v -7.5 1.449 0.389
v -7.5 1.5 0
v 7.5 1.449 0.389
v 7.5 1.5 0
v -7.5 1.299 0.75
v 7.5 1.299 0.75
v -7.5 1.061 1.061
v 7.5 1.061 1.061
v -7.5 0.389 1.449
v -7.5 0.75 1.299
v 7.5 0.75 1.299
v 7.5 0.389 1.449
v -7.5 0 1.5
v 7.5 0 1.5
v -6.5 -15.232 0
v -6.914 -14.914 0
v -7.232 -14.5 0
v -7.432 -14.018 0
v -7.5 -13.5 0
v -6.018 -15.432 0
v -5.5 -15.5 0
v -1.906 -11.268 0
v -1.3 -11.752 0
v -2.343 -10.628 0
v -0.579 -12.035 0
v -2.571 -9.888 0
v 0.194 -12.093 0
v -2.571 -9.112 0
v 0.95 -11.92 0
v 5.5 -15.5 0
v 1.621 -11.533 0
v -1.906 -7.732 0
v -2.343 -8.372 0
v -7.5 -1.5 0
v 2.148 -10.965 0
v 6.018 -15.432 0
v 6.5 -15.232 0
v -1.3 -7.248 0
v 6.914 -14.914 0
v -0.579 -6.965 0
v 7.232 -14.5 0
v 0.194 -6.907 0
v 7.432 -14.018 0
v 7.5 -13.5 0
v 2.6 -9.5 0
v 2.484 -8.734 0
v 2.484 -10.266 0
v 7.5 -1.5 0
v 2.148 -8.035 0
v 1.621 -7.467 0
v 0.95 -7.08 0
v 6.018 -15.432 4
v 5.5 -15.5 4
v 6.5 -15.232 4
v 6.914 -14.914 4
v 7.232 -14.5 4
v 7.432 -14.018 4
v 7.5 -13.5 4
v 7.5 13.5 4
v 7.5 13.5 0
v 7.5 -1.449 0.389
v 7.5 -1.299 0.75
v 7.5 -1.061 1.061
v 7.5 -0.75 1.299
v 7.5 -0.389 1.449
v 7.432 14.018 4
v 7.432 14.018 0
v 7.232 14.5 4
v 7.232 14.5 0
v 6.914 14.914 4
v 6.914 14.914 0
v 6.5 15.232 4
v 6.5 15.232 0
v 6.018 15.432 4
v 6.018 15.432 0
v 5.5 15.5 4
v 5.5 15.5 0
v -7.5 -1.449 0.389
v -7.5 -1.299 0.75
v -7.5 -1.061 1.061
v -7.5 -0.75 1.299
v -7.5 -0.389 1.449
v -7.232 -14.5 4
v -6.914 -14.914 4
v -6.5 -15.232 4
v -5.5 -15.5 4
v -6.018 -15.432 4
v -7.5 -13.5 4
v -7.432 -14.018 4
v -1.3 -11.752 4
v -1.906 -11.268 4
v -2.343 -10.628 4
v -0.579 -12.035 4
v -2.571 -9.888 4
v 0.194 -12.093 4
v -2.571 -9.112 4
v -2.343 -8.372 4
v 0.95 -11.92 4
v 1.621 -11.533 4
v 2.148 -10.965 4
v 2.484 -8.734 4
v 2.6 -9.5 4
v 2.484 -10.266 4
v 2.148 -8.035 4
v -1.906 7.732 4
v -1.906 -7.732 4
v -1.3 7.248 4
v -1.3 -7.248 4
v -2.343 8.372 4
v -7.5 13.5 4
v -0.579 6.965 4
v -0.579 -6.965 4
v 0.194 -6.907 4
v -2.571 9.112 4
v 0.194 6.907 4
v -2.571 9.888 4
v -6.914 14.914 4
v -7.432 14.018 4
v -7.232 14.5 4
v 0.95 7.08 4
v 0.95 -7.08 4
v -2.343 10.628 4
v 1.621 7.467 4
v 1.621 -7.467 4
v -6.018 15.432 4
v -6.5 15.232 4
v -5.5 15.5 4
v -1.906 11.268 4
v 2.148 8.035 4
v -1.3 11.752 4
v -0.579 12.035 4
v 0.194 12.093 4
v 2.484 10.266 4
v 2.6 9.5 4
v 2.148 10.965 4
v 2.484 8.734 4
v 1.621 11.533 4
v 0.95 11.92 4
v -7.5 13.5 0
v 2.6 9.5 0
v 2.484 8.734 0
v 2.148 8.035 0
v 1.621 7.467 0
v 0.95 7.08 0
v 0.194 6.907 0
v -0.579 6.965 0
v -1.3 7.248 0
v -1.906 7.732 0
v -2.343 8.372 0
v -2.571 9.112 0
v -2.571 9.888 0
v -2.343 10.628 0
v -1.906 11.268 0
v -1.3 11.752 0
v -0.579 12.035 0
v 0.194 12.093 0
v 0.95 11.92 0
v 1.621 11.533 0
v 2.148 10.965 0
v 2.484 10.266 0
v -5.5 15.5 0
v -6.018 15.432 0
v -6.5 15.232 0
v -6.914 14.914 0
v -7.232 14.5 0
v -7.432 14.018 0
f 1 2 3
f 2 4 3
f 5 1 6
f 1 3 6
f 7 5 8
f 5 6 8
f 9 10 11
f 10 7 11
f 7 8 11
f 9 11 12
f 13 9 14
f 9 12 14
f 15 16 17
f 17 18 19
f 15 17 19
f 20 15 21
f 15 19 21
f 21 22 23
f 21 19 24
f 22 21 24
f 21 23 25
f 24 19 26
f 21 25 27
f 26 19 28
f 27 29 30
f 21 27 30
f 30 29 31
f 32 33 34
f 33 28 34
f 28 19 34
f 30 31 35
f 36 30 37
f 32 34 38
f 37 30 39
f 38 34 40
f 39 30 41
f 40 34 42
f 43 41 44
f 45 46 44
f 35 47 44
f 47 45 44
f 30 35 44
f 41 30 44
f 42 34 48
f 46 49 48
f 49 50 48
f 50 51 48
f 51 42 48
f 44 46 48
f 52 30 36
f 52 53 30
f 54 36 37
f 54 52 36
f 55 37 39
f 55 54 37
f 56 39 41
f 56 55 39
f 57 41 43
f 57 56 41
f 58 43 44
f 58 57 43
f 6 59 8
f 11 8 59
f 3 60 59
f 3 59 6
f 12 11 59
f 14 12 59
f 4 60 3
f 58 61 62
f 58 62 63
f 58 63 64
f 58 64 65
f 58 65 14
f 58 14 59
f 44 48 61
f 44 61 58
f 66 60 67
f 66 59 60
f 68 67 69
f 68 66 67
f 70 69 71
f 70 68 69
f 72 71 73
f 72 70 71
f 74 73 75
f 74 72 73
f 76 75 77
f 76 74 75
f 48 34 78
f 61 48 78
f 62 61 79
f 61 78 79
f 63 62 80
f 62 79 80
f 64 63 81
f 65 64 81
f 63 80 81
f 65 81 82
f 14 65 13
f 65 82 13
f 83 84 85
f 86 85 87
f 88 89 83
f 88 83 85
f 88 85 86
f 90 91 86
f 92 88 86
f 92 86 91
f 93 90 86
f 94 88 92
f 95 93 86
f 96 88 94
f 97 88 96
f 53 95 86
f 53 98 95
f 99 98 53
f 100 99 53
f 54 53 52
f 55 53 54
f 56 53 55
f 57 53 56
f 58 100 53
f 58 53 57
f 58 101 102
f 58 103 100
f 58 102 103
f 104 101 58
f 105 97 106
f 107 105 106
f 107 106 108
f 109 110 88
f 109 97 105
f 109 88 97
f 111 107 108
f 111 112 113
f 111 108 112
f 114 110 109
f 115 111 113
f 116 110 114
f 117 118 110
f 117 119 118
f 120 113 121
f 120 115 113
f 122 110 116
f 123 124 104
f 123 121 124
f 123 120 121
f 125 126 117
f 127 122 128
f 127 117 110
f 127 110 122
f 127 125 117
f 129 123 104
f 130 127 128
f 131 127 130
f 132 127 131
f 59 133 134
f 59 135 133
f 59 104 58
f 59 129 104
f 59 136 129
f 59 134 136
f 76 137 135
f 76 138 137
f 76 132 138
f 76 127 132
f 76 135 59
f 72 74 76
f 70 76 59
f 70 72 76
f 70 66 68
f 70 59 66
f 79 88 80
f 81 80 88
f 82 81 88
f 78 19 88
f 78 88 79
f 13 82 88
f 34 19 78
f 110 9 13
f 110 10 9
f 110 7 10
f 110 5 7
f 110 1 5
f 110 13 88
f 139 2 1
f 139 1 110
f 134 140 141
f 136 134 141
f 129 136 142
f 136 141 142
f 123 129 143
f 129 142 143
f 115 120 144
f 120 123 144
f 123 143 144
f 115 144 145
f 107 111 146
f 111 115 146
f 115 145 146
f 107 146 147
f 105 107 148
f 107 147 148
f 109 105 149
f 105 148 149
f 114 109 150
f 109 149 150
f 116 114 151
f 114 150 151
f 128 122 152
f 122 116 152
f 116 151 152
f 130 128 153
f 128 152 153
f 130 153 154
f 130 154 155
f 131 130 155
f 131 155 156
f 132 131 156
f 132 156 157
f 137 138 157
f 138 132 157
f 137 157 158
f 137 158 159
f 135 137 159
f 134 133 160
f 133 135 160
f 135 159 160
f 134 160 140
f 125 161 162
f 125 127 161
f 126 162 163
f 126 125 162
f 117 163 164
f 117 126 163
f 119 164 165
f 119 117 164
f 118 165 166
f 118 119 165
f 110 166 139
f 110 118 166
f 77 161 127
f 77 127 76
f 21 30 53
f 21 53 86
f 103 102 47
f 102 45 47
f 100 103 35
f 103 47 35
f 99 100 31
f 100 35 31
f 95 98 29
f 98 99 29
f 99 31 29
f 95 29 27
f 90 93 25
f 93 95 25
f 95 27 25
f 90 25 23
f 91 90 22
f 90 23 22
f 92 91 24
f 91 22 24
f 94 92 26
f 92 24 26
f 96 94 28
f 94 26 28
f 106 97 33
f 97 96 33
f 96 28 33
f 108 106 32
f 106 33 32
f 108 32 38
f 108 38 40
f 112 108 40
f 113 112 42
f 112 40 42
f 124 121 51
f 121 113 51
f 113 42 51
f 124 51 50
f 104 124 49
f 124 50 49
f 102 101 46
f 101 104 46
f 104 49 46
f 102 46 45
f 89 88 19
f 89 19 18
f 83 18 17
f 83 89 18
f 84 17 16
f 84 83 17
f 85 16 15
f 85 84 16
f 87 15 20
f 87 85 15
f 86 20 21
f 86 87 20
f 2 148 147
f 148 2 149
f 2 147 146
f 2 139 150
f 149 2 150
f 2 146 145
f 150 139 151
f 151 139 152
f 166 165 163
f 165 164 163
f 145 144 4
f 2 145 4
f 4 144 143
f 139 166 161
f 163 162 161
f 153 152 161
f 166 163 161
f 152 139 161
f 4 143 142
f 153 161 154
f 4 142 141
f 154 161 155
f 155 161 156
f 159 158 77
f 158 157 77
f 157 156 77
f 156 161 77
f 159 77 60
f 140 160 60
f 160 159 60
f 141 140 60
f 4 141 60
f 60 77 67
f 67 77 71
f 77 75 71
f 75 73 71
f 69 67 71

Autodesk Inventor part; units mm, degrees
ref_plane "YZ Plane" through (0, 0, 0) normal (1, 0, 0) x (0, 1, 0)
ref_plane "XZ Plane" through (0, 0, 0) normal (0, 1, 0) x (-1, 0, 0)
ref_plane "XY Plane" through (0, 0, 0) normal (0, 0, 1) x (1, 0, 0)
ref_plane "Plano de trabalho1" through (0, 0, 0) normal (0, 0, 1) x (1, 0, 0)
sketch "Esboço1" plane through (0, 0, 0) normal (0, 0, 1) x (1, 0, 0)
  circle A0 centre (0, 9.5) radius 2.6
  line L0 (-7.5, -1.5) -> (-7.5, 1.5)
  line L1 (7.5, -1.5) -> (-7.5, -1.5)
  line L2 (7.5, 1.5) -> (7.5, -1.5)
  line L3 (-7.5, 1.5) -> (7.5, 1.5)
  circle A1 centre (0, -9.5) radius 2.6
  line L4 (-7.5, 1.5) -> (7.5, 1.5)
  line L5 (7.5, 1.5) -> (7.5, 15.5)
  line L6 (-7.5, 15.5) -> (-7.5, 1.5)
  circle A2 centre (0, 9.5) radius 2.1
  line L7 (7.5, -1.5) -> (-7.5, -1.5)
  line L8 (-7.5, -1.5) -> (-7.5, -15.5)
  line L9 (7.5, -15.5) -> (7.5, -1.5)
  circle A3 centre (0, -9.5) radius 2.1
  line L10 (-7.5, 15.5) -> (7.5, 15.5)
  line L11 (7.5, 15.5) -> (7.5, -15.5)
  line L12 (7.5, -15.5) -> (-7.5, -15.5)
  line L13 (-7.5, -15.5) -> (-7.5, 15.5)
  point P0 (0, 0)
  dimension "d0" = 14
  dimension "d1" = 14
  dimension "d7" = 5.2
  dimension "d8" = 5.2
extrude "Extrusão1" add sketch "Esboço1" along normal blind 4 contours L0 L3 L2 L1 | L1 L9 L12 L8 | L6 L10 L5 L3
extrude "Extrusão2" cut sketch "Esboço1" along normal blind 1.5 contours L0 L3 L2 L1
fillet "Arredondamento1" radius 2 4 edges at (-7.5, 15.5, 2) (7.5, 15.5, 2) (-7.5, -15.5, 2) (7.5, -15.5, 2)
fillet "Arredondamento2" radius 1.5 2 edges at (0, -1.5, 1.5) (0, 1.5, 1.5)
equation "\"d1\" = d0"
equation "\"d8\" = d7"
properties part number "tampa_suporte_termopar"
